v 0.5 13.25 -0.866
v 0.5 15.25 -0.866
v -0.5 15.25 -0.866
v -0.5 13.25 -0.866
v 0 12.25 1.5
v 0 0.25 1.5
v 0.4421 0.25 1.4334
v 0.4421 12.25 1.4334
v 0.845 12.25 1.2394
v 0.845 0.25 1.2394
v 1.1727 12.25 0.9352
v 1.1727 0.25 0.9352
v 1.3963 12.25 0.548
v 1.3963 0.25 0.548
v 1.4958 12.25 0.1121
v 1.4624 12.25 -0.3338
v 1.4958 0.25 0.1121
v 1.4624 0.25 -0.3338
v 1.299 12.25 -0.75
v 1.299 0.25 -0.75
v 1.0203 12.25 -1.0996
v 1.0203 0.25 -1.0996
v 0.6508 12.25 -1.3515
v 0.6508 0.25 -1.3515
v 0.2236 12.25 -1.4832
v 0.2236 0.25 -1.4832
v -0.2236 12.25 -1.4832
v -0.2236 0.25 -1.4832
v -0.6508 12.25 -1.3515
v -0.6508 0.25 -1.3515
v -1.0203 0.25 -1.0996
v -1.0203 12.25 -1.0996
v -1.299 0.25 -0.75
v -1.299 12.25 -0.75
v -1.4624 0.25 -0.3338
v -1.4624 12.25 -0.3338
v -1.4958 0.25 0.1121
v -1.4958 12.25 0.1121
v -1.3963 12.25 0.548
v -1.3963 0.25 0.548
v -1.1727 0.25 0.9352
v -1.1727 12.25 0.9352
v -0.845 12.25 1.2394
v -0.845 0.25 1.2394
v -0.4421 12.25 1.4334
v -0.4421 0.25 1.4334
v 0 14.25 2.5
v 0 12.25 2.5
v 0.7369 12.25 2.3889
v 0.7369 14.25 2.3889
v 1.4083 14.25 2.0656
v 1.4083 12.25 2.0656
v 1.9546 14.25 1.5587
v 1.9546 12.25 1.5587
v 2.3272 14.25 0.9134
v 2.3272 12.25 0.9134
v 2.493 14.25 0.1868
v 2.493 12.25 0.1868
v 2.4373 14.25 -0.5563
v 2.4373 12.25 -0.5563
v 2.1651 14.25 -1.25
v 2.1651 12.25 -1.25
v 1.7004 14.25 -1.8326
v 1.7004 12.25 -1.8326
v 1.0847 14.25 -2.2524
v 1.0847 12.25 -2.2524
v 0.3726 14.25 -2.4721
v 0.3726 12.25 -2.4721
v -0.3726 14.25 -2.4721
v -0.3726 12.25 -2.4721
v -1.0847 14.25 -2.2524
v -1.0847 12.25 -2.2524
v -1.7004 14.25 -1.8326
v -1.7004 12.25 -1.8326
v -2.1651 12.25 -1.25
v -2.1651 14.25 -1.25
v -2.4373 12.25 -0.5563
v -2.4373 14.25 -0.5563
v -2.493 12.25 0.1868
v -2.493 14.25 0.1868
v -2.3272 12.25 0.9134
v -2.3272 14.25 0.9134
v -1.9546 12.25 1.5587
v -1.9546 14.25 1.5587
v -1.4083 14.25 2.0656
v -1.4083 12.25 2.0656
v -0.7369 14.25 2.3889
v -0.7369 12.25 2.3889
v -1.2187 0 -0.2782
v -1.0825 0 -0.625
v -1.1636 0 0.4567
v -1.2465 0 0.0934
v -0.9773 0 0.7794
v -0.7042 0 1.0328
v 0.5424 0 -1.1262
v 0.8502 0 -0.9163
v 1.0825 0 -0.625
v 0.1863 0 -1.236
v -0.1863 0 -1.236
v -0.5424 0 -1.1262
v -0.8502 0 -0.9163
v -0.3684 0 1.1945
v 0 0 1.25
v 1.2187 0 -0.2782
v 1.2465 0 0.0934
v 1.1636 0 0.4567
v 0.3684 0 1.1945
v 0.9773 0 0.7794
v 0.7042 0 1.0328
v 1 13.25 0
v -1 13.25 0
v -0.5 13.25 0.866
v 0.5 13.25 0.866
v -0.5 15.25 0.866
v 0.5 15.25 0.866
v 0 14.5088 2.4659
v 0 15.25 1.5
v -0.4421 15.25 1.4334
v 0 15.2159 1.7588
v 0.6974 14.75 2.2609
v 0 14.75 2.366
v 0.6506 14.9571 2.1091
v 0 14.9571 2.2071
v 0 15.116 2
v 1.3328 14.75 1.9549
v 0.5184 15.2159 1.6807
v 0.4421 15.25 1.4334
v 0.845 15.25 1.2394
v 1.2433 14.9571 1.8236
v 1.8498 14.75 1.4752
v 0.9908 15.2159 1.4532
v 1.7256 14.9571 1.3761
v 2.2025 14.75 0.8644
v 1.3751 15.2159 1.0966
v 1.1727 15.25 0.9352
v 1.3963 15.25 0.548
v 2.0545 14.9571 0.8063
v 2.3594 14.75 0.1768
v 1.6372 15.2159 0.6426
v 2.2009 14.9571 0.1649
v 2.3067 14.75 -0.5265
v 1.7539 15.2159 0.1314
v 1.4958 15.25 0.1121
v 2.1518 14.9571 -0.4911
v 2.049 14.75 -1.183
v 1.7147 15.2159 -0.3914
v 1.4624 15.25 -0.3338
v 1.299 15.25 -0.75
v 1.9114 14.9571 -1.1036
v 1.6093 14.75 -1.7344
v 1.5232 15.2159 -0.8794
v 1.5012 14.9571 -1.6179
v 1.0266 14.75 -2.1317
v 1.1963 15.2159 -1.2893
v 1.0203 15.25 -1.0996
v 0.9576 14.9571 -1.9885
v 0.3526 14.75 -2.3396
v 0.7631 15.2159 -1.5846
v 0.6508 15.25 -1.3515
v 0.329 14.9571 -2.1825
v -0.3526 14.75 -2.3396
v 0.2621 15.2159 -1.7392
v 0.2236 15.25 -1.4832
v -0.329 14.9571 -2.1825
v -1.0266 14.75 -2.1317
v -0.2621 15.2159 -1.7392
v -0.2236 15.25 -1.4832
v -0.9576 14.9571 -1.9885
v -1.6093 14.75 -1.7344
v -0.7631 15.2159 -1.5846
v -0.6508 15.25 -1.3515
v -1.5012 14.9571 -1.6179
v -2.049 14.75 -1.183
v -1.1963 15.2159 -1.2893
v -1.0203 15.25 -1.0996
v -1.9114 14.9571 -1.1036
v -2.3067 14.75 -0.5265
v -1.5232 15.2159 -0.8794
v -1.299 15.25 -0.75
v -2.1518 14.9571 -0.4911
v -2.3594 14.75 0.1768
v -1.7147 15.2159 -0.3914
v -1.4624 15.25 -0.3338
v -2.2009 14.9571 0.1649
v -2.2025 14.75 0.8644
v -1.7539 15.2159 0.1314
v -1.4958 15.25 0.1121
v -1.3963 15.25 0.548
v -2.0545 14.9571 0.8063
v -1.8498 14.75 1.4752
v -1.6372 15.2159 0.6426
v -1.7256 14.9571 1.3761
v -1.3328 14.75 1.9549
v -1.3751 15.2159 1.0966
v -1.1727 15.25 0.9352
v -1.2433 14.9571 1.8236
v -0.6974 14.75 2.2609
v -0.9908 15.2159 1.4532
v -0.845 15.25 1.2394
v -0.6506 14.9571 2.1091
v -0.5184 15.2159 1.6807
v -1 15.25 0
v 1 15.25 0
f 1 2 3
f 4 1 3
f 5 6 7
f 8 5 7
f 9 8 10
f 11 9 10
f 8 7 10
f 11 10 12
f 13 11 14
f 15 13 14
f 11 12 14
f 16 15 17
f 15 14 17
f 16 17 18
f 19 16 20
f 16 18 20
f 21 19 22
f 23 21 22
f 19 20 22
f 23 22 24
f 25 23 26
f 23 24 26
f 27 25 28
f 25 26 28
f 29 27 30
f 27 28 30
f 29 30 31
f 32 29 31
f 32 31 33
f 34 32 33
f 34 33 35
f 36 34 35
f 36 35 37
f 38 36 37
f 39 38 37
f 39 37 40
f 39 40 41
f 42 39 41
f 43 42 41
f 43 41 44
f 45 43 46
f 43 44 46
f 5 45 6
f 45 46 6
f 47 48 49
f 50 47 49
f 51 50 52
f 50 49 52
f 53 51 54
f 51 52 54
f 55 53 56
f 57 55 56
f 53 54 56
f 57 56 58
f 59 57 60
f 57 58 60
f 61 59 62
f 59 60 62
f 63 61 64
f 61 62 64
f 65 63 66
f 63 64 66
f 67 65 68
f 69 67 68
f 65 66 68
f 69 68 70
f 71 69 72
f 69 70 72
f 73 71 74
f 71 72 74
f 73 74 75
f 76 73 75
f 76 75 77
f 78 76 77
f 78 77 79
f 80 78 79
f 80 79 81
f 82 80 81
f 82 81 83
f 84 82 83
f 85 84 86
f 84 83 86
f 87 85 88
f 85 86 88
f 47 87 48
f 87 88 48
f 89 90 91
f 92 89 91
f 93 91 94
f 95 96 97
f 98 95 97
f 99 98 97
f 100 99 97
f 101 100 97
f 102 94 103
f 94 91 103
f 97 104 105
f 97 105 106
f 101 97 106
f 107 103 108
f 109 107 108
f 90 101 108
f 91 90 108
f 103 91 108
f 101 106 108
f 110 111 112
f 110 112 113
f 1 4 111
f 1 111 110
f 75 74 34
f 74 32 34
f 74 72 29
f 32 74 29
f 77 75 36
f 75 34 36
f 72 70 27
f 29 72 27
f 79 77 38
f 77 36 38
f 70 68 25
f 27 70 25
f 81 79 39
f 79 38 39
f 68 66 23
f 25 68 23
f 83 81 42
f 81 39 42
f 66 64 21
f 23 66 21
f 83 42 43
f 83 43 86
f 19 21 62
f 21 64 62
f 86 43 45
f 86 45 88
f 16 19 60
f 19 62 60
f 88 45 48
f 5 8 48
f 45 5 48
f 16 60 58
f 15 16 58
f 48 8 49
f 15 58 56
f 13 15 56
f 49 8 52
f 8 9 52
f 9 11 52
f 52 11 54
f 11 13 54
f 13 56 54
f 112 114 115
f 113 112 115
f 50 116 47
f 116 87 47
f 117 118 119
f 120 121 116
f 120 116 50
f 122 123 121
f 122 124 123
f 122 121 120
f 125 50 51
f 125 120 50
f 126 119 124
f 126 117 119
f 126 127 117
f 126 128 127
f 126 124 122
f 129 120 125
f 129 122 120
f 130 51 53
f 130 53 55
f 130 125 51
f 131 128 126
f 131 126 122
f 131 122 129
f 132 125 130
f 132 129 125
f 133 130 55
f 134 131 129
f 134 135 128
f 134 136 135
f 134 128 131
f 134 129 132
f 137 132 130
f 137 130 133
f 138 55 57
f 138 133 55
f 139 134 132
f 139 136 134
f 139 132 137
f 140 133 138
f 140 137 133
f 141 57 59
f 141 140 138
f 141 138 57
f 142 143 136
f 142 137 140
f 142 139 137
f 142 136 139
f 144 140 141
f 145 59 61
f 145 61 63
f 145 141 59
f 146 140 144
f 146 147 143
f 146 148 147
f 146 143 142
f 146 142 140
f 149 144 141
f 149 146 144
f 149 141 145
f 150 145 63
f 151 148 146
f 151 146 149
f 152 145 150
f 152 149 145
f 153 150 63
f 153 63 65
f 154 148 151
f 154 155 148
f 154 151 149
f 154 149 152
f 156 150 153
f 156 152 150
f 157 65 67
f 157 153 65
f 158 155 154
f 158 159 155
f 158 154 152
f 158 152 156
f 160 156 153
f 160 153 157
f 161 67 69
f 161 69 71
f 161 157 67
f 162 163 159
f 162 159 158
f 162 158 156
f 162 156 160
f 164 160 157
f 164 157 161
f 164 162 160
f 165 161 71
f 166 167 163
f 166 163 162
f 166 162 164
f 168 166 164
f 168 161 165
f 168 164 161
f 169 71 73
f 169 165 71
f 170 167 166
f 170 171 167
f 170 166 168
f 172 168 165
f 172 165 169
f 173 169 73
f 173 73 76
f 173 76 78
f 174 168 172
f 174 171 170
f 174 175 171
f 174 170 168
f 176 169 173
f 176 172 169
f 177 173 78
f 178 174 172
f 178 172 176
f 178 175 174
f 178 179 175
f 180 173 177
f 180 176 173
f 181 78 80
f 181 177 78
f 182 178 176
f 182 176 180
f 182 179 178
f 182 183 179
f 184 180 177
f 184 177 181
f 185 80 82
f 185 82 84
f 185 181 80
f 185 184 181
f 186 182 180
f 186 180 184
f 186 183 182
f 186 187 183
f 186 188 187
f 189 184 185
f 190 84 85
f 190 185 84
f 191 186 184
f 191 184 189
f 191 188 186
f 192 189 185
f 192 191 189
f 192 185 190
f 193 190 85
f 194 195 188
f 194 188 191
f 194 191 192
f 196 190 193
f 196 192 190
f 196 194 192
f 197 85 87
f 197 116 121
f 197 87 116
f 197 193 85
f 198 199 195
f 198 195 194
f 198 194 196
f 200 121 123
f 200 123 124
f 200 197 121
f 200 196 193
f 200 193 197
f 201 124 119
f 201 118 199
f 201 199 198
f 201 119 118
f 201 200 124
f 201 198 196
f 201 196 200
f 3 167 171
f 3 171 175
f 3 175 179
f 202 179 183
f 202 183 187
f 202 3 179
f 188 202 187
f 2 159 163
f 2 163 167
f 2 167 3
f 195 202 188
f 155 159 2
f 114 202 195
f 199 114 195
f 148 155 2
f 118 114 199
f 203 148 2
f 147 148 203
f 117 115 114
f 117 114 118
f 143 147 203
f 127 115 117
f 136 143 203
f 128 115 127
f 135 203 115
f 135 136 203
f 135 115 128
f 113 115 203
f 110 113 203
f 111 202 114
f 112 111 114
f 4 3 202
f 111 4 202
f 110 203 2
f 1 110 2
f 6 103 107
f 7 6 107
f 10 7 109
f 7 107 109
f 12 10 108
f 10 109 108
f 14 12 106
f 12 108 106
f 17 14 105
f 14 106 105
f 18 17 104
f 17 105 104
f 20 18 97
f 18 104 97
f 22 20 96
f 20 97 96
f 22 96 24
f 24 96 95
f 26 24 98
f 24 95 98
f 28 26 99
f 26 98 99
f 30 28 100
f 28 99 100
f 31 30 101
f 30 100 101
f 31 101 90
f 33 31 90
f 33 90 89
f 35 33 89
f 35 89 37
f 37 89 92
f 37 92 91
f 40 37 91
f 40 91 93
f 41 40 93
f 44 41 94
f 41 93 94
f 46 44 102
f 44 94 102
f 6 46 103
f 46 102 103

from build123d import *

# Parameters (mm, degrees)
SKETCH1_R           = 1.5
BOSS_EXTRUDE1_DEPTH = 12.25
SKETCH2_R           = 2.5
BOSS_EXTRUDE2_DEPTH = 3
FILLET1_R           = 1
CHAMFER1_SIZE       = 0.25
CUT_EXTRUDE1_DEPTH  = 2


with BuildPart() as part:
    # Sketch1 → Boss-Extrude1 (new body)
    with BuildSketch(Plane(origin=(0, 0, 0), x_dir=(1, 0, 0), z_dir=(0, 1, 0))):
        with Locations(Location((0, 0, 0), (0, 0, 270))):
            Circle(SKETCH1_R)
    extrude(amount=BOSS_EXTRUDE1_DEPTH)

    # Sketch2 → Boss-Extrude2 (add)
    with BuildSketch(Plane(origin=(0, 12.25, 0), x_dir=(1, 0, 0), z_dir=(0, 1, 0))):
        with Locations(Location((0, 0, 0), (0, 0, 270))):
            Circle(SKETCH2_R)
    extrude(amount=BOSS_EXTRUDE2_DEPTH)

    # Fillet1
    fillet1_edges = [part.edges().sort_by_distance(p)[0] for p in [
        (0, 15.25, -2.5),
    ]]
    fillet(fillet1_edges, radius=FILLET1_R)

    # Chamfer1
    chamfer1_edges = [part.edges().sort_by_distance(p)[0] for p in [
        (0, 0, -1.5),
    ]]
    chamfer(chamfer1_edges, length=CHAMFER1_SIZE)

    # Sketch3 → Cut-Extrude1 (cut)
    with BuildSketch(Plane(origin=(0, 15.25, 0), x_dir=(1, 0, 0), z_dir=(0, 1, 0))):
        Polygon((-1, 0), (-0.5, -0.866025404), (0.5, -0.866025404), (1, 0), (0.5, 0.866025404), (-0.5, 0.866025404), align=None)
    extrude(amount=-CUT_EXTRUDE1_DEPTH, mode=Mode.SUBTRACT)


solid = part.part
